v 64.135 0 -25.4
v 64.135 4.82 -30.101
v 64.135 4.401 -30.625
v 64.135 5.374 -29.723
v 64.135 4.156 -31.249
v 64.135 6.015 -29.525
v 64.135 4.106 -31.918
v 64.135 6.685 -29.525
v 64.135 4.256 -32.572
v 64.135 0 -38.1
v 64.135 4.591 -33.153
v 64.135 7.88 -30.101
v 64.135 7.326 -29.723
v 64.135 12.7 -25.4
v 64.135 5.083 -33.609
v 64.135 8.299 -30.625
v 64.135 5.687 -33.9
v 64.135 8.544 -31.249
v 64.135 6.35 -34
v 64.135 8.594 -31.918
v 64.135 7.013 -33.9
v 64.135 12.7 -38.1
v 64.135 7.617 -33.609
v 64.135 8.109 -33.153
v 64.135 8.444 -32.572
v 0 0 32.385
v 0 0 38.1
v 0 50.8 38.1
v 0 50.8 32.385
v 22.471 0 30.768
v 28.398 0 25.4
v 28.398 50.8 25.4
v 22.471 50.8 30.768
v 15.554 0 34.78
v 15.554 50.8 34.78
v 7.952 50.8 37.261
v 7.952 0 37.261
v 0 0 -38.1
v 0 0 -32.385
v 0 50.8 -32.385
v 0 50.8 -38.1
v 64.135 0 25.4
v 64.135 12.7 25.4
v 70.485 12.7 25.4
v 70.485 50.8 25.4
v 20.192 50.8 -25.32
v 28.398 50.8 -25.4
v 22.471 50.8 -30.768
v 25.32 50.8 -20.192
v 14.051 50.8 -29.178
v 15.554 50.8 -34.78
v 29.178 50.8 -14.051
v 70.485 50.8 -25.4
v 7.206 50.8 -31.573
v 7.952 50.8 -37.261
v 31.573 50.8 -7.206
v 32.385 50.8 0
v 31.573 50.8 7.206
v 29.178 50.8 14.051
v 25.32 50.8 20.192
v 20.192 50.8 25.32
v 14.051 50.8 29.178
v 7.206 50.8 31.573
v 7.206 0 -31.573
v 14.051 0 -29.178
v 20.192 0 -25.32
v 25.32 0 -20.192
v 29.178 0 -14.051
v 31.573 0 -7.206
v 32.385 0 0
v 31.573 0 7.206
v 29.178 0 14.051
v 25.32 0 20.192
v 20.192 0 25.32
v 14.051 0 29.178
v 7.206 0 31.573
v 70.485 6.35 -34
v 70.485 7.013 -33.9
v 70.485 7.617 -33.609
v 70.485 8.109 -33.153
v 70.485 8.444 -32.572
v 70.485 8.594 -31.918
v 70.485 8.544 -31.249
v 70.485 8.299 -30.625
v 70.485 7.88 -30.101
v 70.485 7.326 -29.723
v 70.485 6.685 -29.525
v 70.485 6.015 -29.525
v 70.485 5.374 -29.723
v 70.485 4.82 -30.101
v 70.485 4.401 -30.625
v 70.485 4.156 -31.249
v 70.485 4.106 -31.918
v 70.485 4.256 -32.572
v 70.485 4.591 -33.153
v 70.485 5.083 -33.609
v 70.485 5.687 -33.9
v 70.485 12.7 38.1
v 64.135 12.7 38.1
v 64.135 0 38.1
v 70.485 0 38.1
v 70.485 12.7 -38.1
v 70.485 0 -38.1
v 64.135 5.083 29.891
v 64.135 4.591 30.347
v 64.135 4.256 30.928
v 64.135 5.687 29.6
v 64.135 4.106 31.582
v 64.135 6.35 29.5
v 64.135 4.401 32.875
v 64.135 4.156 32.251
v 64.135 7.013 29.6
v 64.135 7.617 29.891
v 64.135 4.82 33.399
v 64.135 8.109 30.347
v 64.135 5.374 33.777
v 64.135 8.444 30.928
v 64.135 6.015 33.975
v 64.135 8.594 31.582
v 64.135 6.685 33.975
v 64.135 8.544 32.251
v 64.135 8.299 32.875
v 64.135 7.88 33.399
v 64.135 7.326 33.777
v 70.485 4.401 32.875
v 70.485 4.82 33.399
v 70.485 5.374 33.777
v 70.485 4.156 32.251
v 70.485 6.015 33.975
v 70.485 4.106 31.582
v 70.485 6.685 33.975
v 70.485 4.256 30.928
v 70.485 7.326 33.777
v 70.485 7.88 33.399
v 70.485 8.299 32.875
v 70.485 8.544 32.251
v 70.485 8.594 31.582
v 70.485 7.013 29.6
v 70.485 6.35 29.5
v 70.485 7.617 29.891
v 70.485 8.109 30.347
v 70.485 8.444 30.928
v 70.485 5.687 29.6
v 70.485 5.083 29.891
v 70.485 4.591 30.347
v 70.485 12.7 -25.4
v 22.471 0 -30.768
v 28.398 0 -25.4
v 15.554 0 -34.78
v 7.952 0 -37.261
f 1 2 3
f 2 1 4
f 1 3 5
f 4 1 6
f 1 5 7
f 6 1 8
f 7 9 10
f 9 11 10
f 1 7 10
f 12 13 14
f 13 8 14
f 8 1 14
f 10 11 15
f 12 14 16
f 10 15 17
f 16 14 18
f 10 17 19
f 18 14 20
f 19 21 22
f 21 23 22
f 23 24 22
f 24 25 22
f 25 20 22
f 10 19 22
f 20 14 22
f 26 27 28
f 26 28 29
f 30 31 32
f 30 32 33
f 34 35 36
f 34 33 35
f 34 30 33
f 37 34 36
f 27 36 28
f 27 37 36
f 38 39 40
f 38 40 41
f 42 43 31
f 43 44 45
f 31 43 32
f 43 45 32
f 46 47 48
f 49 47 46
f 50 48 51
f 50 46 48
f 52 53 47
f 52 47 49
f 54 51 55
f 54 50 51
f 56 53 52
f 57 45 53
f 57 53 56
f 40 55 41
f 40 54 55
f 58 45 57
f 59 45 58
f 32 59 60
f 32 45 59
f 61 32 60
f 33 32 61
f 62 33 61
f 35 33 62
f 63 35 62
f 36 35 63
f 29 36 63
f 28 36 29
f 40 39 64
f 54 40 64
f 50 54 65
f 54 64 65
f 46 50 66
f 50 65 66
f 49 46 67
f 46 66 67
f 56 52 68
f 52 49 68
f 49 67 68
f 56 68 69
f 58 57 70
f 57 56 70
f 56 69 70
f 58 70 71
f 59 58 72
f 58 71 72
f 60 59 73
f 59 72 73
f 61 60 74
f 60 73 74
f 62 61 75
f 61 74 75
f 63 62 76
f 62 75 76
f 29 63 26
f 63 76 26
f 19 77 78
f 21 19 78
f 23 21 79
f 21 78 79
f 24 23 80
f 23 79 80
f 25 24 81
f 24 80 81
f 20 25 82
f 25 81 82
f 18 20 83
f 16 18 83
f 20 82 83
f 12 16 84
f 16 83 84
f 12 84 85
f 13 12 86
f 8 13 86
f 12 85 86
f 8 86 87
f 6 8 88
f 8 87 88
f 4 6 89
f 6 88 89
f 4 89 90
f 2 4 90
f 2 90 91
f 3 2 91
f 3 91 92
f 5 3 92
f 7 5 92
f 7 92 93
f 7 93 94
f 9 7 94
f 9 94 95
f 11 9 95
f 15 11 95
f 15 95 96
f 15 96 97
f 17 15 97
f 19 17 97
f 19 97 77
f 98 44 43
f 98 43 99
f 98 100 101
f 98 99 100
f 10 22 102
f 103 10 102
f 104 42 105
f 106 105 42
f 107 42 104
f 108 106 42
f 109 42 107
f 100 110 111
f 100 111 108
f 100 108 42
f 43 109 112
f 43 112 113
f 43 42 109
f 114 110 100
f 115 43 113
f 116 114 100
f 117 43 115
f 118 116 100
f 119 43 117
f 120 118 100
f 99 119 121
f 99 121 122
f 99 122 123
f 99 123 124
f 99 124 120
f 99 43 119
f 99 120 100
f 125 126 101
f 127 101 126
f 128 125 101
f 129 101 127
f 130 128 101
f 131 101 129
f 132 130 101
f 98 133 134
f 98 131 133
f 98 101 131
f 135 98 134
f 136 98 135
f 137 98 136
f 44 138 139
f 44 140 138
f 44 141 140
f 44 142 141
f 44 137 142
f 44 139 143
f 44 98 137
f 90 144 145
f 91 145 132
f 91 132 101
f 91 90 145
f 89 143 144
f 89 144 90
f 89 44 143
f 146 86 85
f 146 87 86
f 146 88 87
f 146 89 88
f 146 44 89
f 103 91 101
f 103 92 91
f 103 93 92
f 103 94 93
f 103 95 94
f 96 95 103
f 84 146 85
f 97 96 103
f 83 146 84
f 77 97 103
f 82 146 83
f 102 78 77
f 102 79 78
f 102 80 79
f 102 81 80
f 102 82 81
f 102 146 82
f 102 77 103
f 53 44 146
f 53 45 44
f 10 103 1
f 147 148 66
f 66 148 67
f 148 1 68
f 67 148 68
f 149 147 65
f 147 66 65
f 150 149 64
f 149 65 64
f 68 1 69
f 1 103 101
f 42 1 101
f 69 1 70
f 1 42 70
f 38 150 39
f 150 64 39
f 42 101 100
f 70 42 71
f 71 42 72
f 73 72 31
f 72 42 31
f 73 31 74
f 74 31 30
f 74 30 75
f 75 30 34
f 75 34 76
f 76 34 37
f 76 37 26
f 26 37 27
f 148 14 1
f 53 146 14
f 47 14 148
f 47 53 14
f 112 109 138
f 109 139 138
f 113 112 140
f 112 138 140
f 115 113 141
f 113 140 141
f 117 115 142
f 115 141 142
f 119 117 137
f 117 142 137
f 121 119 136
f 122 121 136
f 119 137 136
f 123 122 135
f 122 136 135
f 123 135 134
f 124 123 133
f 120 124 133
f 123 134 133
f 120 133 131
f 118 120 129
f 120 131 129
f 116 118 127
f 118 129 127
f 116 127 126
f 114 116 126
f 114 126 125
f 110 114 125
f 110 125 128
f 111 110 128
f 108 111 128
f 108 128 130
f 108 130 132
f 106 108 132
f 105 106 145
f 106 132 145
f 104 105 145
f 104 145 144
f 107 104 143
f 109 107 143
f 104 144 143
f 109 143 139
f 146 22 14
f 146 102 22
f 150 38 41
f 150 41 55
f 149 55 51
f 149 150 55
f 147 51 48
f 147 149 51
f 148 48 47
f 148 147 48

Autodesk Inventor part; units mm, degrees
ref_plane "YZ Plane" through (0, 0, 0) normal (1, 0, 0) x (0, 1, 0)
ref_plane "XZ Plane" through (0, 0, 0) normal (0, 1, 0) x (-1, 0, 0)
ref_plane "XY Plane" through (0, 0, 0) normal (0, 0, 1) x (1, 0, 0)
sketch "Sketch1" plane through (0, 0, 0) normal (0, 1, 0) x (-1, 0, 0)
  circle A0 centre (0, 0) radius 32.385
  circle A1 centre (0, 0) radius 38.1
  line L0 (0, 38.1) -> (0, 32.385)
  line L1 (0, -32.385) -> (0, -38.1)
  dimension "d0" = 64.77
  dimension "d1" = 76.2
extrude "Extrusion1" add sketch "Sketch1" along normal blind 76.2 contours A0 L1 A1 L0 picked at (-2.826, -35.8766)
sketch "Sketch2" plane through (0, 76.2, 0) normal (0, 1, 0) x (1, 0, 0)
  arc A0 (0, -32.385) -> (0, 32.385) centre (0, 0) ccw projected
  line L0 (32.385, 0) -> (70.485, 0)
  line L1 (70.485, 0) -> (70.485, -25.4)
  line L2 (70.485, -25.4) -> (28.3981, -25.4)
  arc A1 (0, -38.1) -> (0, 38.1) centre (0, 0) ccw projected
  line L3 (70.485, 0) -> (70.485, 25.4)
  line L4 (70.485, 25.4) -> (28.3981, 25.4)
  arc A2 (28.3981, -25.4) -> (28.3981, 25.4) centre (0, 0) ccw
  dimension "d4" = 38.1
  dimension "d5" = 25.4
  dimension "d6" = 25.4
extrude "Extrusion2" add sketch "Sketch2" against normal blind 76.2
sketch "Sketch3" plane through (0, 76.2, 0) normal (0, 1, 0) x (1, 0, 0)
  line L0 (70.485, -25.4) -> (28.3981, -25.4) projected
  line L1 (70.485, -25.4) -> (64.135, -25.4)
  line L2 (64.135, -25.4) -> (64.135, -38.1)
  line L3 (64.135, -38.1) -> (70.485, -38.1)
  line L4 (70.485, -38.1) -> (70.485, -25.4)
  line L5 (28.3981, 25.4) -> (70.485, 25.4) projected
  line L6 (70.485, 25.4) -> (64.135, 25.4)
  line L7 (64.135, 25.4) -> (64.135, 38.1)
  line L8 (64.135, 38.1) -> (70.485, 38.1)
  line L9 (70.485, 38.1) -> (70.485, 25.4)
  point P0 (0, 0)
  dimension "d9" = 6.35
  dimension "d10" = 12.7
  dimension "d11" = 6.35
  dimension "d12" = 12.7
extrude "Extrusion3" add sketch "Sketch3" against normal blind 76.2
sketch "Sketch4" plane through (70.485, 76.2, 38.1) normal (1, 0, 0) x (0, 0, -1)
  line L0 (0, -76.2) -> (0, 0) projected
  line L1 (0, 0) -> (12.7, 0)
  line L2 (12.7, 0) -> (12.7, -76.2)
  line L3 (12.7, -76.2) -> (0, -76.2)
  line L4 (0, -76.2) -> (0, 0)
  line L5 (63.5, 0) -> (63.5, -76.2) projected
  line L6 (76.2, 0) -> (76.2, -76.2) projected
  line L7 (63.5, -76.2) -> (76.2, -76.2)
  line L8 (76.2, -76.2) -> (76.2, 0)
  line L9 (76.2, 0) -> (63.5, 0)
  line L10 (63.5, 0) -> (63.5, -76.2)
  line L11 (0, -76.2) -> (12.7, -76.2)
  line L12 (12.7, -76.2) -> (12.7, -63.5)
  line L13 (12.7, -63.5) -> (0, -63.5)
  line L14 (0, -63.5) -> (0, -76.2)
  line L15 (0, 0) -> (76.2, 0) projected
  line L16 (0, 0) -> (12.7, 0)
  line L17 (12.7, 0) -> (12.7, -12.7)
  line L18 (12.7, -12.7) -> (0, -12.7)
  line L19 (0, -12.7) -> (0, 0)
  line L20 (63.5, -76.2) -> (76.2, -76.2)
  line L21 (76.2, -76.2) -> (76.2, -63.5)
  line L22 (76.2, -63.5) -> (63.5, -63.5)
  line L23 (63.5, -63.5) -> (63.5, -76.2)
  line L24 (63.5, 0) -> (76.2, 0)
  line L25 (76.2, 0) -> (76.2, -12.7)
  line L26 (76.2, -12.7) -> (63.5, -12.7)
  line L27 (63.5, -12.7) -> (63.5, 0)
  point P0 (38.1, -76.2)
  dimension "d15" = 12.7
  dimension "d16" = 12.7
  dimension "d17" = 12.7
  dimension "d18" = 12.7
  dimension "d19" = 12.7
  dimension "d20" = 12.7
  dimension "d21" = 12.7
  dimension "d22" = 12.7
extrude "Extrusion4" cut sketch "Sketch4" against normal blind 36.5125 contours L0 L18 L2 L13 | L26 L6 L22 L5
sketch "Sketch5" plane through (70.485, 76.2, 38.1) normal (1, 0, 0) x (0, 0, -1)
  line L0 (12.7, -12.7) -> (0, -12.7) projected
  line L1 (0, -76.2) -> (0, 0) projected
  line L2 (12.7, -12.7) -> (0, -12.7)
  line L3 (0, -12.7) -> (0, 0)
  line L4 (0, 0) -> (12.7, 0)
  line L5 (12.7, 0) -> (12.7, -12.7)
  line L6 (76.2, -12.7) -> (63.5, -12.7) projected
  line L7 (63.5, 0) -> (76.2, 0) projected
  line L8 (63.5, -12.7) -> (76.2, -12.7)
  line L9 (76.2, -12.7) -> (76.2, 0)
  line L10 (76.2, 0) -> (63.5, 0)
  line L11 (63.5, 0) -> (63.5, -12.7)
  line L12 (12.7, -63.5) -> (0, -63.5) projected
  line L13 (0, -76.2) -> (12.7, -76.2) projected
  line L14 (12.7, -63.5) -> (0, -63.5)
  line L15 (0, -63.5) -> (0, -76.2)
  line L16 (0, -76.2) -> (12.7, -76.2)
  line L17 (12.7, -76.2) -> (12.7, -63.5)
  line L18 (63.5, -63.5) -> (63.5, -12.7) projected
  line L19 (63.5, -76.2) -> (76.2, -76.2) projected
  line L20 (63.5, -63.5) -> (76.2, -63.5)
  line L21 (76.2, -63.5) -> (76.2, -76.2)
  line L22 (76.2, -76.2) -> (63.5, -76.2)
  line L23 (63.5, -76.2) -> (63.5, -63.5)
  circle A0 centre (6.35, -6.35) radius 2.25
  circle A1 centre (69.85, -6.35) radius 2.25
  circle A2 centre (6.35, -69.85) radius 2.25
  circle A3 centre (69.85, -69.85) radius 2.25
  point P0 (38.1, -76.2)
  dimension "d25" = 4.5
  dimension "d26" = 4.5
  dimension "d27" = 4.5
  dimension "d28" = 4.5
extrude "Extrusion5" cut sketch "Sketch5" against normal blind 36.5125 contours A0 | A1 | A2 | A3
thicken "Thicken1" operation add thickness 25.4 both sides no extend neighbours yes toward (0, -1, 0) faces at (53.473, 76.2, 1.3012)
properties part number "motor support"
